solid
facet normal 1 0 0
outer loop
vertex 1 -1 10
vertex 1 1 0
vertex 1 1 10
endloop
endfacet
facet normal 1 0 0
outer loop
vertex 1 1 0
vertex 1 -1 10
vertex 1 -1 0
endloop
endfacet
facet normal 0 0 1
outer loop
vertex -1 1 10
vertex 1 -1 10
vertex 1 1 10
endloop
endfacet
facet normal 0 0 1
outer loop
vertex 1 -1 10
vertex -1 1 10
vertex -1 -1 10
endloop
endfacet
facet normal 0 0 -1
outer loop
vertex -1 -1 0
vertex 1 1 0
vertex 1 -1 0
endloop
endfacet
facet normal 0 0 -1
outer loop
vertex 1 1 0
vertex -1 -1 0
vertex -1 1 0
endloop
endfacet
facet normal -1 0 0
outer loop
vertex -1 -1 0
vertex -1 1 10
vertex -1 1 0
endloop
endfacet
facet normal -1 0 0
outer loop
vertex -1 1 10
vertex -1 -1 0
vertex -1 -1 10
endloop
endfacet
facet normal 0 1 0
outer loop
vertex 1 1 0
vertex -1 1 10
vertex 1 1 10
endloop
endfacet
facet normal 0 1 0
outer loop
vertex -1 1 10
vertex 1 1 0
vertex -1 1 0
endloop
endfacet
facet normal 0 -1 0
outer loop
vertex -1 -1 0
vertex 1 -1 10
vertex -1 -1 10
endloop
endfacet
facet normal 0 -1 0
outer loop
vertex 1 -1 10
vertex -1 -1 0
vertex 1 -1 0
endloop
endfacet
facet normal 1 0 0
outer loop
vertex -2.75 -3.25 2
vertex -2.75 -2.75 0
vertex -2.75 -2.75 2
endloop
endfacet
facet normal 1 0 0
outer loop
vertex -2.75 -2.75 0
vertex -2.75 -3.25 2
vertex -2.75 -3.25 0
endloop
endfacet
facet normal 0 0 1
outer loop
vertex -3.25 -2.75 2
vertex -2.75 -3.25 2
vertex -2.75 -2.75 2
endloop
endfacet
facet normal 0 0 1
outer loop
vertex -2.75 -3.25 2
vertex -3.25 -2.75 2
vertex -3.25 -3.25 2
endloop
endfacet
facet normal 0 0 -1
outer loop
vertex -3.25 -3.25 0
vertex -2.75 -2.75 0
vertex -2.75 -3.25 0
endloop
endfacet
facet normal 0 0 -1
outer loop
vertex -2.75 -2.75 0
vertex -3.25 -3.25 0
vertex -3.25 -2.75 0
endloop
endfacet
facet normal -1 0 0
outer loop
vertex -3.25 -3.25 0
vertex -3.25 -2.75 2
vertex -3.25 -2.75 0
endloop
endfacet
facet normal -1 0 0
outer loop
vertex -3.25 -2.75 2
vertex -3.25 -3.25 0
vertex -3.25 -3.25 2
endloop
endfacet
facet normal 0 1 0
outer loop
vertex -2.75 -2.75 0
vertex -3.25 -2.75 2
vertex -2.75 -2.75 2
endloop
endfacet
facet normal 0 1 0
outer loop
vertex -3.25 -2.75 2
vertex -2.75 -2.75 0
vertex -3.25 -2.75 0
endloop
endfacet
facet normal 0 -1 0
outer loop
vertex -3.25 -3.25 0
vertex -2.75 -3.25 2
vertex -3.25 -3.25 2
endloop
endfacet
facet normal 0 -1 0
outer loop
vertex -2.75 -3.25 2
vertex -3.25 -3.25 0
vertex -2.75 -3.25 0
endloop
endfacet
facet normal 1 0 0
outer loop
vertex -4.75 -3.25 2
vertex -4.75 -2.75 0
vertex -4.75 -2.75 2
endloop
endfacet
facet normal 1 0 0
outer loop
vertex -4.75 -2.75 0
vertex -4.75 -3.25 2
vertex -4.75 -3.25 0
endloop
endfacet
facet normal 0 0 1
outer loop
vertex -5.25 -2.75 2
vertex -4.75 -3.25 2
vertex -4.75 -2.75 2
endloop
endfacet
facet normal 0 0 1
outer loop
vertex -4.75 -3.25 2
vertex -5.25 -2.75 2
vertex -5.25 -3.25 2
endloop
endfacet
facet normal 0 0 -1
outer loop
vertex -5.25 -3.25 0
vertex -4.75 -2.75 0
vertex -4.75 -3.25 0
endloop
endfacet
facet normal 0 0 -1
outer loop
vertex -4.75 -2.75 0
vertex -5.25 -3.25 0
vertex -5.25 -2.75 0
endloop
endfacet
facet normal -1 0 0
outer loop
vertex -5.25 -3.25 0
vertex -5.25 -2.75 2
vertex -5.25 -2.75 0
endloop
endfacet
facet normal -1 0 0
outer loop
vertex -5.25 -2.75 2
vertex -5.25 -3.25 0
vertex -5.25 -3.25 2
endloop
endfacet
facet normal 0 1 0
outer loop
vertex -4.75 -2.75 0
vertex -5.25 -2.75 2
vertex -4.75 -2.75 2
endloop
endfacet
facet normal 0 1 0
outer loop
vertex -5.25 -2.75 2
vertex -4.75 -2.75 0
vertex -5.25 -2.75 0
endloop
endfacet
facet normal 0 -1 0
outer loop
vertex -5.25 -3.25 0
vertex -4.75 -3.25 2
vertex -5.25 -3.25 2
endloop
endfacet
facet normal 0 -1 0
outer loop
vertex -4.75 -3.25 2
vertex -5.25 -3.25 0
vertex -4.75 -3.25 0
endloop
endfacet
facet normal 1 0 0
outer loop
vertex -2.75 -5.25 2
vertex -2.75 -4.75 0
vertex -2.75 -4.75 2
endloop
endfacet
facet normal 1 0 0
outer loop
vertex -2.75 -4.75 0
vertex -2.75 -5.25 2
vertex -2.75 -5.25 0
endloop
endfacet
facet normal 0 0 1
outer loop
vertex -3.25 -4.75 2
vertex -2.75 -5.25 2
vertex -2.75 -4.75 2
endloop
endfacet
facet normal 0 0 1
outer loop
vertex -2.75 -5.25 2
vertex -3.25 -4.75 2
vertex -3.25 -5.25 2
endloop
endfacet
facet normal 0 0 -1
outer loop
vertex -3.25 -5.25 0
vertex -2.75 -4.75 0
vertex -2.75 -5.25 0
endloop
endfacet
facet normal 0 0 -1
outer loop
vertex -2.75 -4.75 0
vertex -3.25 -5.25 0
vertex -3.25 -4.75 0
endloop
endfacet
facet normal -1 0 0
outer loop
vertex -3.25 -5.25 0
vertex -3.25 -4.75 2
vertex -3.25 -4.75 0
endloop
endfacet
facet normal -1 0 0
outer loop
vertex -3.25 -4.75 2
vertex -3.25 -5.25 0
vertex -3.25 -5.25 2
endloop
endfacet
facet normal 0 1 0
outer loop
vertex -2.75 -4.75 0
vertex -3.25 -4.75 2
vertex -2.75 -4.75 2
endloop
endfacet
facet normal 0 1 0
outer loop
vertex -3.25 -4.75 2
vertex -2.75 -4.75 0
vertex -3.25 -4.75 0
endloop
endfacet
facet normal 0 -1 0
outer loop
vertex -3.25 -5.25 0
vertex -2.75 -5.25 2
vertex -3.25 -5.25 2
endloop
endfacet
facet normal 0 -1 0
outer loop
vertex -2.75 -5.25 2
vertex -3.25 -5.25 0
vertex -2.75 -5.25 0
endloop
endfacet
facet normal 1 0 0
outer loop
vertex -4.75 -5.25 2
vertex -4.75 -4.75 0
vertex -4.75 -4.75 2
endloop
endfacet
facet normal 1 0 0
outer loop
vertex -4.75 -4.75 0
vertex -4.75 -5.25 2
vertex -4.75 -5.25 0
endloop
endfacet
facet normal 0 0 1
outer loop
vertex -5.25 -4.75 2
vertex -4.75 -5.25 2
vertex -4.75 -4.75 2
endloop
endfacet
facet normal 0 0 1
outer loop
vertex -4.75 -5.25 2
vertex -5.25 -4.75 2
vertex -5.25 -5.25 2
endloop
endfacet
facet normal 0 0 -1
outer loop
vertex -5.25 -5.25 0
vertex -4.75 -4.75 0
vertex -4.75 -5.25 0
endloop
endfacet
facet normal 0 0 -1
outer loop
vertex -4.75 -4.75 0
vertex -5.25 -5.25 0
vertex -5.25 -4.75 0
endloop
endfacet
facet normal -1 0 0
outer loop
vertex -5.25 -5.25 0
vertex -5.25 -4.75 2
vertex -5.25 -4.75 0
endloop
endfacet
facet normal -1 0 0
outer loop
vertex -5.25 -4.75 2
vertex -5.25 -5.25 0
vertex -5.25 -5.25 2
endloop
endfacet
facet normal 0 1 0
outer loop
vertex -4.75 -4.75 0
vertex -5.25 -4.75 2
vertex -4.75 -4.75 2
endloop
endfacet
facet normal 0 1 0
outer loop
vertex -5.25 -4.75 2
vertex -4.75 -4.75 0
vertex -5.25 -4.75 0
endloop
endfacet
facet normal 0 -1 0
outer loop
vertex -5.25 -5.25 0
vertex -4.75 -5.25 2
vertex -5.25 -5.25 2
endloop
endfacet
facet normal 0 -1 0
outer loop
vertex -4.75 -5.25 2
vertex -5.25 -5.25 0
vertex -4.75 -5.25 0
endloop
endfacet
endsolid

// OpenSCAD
translate([0, 0, 5]) color([0,1,0,0.9]) cube([2, 2, 10], center=true);
translate([-3, -3, 1]) color([1,0,0]) cube([0.5, 0.5, 2], center=true);
translate([-5, -3, 1]) color([1,0,0]) cube([0.5, 0.5, 2], center=true);
translate([-3, -5, 1]) color([1,0,0]) cube([0.5, 0.5, 2], center=true);
translate([-5, -5, 1]) color([1,0,0]) cube([0.5, 0.5, 2], center=true);
